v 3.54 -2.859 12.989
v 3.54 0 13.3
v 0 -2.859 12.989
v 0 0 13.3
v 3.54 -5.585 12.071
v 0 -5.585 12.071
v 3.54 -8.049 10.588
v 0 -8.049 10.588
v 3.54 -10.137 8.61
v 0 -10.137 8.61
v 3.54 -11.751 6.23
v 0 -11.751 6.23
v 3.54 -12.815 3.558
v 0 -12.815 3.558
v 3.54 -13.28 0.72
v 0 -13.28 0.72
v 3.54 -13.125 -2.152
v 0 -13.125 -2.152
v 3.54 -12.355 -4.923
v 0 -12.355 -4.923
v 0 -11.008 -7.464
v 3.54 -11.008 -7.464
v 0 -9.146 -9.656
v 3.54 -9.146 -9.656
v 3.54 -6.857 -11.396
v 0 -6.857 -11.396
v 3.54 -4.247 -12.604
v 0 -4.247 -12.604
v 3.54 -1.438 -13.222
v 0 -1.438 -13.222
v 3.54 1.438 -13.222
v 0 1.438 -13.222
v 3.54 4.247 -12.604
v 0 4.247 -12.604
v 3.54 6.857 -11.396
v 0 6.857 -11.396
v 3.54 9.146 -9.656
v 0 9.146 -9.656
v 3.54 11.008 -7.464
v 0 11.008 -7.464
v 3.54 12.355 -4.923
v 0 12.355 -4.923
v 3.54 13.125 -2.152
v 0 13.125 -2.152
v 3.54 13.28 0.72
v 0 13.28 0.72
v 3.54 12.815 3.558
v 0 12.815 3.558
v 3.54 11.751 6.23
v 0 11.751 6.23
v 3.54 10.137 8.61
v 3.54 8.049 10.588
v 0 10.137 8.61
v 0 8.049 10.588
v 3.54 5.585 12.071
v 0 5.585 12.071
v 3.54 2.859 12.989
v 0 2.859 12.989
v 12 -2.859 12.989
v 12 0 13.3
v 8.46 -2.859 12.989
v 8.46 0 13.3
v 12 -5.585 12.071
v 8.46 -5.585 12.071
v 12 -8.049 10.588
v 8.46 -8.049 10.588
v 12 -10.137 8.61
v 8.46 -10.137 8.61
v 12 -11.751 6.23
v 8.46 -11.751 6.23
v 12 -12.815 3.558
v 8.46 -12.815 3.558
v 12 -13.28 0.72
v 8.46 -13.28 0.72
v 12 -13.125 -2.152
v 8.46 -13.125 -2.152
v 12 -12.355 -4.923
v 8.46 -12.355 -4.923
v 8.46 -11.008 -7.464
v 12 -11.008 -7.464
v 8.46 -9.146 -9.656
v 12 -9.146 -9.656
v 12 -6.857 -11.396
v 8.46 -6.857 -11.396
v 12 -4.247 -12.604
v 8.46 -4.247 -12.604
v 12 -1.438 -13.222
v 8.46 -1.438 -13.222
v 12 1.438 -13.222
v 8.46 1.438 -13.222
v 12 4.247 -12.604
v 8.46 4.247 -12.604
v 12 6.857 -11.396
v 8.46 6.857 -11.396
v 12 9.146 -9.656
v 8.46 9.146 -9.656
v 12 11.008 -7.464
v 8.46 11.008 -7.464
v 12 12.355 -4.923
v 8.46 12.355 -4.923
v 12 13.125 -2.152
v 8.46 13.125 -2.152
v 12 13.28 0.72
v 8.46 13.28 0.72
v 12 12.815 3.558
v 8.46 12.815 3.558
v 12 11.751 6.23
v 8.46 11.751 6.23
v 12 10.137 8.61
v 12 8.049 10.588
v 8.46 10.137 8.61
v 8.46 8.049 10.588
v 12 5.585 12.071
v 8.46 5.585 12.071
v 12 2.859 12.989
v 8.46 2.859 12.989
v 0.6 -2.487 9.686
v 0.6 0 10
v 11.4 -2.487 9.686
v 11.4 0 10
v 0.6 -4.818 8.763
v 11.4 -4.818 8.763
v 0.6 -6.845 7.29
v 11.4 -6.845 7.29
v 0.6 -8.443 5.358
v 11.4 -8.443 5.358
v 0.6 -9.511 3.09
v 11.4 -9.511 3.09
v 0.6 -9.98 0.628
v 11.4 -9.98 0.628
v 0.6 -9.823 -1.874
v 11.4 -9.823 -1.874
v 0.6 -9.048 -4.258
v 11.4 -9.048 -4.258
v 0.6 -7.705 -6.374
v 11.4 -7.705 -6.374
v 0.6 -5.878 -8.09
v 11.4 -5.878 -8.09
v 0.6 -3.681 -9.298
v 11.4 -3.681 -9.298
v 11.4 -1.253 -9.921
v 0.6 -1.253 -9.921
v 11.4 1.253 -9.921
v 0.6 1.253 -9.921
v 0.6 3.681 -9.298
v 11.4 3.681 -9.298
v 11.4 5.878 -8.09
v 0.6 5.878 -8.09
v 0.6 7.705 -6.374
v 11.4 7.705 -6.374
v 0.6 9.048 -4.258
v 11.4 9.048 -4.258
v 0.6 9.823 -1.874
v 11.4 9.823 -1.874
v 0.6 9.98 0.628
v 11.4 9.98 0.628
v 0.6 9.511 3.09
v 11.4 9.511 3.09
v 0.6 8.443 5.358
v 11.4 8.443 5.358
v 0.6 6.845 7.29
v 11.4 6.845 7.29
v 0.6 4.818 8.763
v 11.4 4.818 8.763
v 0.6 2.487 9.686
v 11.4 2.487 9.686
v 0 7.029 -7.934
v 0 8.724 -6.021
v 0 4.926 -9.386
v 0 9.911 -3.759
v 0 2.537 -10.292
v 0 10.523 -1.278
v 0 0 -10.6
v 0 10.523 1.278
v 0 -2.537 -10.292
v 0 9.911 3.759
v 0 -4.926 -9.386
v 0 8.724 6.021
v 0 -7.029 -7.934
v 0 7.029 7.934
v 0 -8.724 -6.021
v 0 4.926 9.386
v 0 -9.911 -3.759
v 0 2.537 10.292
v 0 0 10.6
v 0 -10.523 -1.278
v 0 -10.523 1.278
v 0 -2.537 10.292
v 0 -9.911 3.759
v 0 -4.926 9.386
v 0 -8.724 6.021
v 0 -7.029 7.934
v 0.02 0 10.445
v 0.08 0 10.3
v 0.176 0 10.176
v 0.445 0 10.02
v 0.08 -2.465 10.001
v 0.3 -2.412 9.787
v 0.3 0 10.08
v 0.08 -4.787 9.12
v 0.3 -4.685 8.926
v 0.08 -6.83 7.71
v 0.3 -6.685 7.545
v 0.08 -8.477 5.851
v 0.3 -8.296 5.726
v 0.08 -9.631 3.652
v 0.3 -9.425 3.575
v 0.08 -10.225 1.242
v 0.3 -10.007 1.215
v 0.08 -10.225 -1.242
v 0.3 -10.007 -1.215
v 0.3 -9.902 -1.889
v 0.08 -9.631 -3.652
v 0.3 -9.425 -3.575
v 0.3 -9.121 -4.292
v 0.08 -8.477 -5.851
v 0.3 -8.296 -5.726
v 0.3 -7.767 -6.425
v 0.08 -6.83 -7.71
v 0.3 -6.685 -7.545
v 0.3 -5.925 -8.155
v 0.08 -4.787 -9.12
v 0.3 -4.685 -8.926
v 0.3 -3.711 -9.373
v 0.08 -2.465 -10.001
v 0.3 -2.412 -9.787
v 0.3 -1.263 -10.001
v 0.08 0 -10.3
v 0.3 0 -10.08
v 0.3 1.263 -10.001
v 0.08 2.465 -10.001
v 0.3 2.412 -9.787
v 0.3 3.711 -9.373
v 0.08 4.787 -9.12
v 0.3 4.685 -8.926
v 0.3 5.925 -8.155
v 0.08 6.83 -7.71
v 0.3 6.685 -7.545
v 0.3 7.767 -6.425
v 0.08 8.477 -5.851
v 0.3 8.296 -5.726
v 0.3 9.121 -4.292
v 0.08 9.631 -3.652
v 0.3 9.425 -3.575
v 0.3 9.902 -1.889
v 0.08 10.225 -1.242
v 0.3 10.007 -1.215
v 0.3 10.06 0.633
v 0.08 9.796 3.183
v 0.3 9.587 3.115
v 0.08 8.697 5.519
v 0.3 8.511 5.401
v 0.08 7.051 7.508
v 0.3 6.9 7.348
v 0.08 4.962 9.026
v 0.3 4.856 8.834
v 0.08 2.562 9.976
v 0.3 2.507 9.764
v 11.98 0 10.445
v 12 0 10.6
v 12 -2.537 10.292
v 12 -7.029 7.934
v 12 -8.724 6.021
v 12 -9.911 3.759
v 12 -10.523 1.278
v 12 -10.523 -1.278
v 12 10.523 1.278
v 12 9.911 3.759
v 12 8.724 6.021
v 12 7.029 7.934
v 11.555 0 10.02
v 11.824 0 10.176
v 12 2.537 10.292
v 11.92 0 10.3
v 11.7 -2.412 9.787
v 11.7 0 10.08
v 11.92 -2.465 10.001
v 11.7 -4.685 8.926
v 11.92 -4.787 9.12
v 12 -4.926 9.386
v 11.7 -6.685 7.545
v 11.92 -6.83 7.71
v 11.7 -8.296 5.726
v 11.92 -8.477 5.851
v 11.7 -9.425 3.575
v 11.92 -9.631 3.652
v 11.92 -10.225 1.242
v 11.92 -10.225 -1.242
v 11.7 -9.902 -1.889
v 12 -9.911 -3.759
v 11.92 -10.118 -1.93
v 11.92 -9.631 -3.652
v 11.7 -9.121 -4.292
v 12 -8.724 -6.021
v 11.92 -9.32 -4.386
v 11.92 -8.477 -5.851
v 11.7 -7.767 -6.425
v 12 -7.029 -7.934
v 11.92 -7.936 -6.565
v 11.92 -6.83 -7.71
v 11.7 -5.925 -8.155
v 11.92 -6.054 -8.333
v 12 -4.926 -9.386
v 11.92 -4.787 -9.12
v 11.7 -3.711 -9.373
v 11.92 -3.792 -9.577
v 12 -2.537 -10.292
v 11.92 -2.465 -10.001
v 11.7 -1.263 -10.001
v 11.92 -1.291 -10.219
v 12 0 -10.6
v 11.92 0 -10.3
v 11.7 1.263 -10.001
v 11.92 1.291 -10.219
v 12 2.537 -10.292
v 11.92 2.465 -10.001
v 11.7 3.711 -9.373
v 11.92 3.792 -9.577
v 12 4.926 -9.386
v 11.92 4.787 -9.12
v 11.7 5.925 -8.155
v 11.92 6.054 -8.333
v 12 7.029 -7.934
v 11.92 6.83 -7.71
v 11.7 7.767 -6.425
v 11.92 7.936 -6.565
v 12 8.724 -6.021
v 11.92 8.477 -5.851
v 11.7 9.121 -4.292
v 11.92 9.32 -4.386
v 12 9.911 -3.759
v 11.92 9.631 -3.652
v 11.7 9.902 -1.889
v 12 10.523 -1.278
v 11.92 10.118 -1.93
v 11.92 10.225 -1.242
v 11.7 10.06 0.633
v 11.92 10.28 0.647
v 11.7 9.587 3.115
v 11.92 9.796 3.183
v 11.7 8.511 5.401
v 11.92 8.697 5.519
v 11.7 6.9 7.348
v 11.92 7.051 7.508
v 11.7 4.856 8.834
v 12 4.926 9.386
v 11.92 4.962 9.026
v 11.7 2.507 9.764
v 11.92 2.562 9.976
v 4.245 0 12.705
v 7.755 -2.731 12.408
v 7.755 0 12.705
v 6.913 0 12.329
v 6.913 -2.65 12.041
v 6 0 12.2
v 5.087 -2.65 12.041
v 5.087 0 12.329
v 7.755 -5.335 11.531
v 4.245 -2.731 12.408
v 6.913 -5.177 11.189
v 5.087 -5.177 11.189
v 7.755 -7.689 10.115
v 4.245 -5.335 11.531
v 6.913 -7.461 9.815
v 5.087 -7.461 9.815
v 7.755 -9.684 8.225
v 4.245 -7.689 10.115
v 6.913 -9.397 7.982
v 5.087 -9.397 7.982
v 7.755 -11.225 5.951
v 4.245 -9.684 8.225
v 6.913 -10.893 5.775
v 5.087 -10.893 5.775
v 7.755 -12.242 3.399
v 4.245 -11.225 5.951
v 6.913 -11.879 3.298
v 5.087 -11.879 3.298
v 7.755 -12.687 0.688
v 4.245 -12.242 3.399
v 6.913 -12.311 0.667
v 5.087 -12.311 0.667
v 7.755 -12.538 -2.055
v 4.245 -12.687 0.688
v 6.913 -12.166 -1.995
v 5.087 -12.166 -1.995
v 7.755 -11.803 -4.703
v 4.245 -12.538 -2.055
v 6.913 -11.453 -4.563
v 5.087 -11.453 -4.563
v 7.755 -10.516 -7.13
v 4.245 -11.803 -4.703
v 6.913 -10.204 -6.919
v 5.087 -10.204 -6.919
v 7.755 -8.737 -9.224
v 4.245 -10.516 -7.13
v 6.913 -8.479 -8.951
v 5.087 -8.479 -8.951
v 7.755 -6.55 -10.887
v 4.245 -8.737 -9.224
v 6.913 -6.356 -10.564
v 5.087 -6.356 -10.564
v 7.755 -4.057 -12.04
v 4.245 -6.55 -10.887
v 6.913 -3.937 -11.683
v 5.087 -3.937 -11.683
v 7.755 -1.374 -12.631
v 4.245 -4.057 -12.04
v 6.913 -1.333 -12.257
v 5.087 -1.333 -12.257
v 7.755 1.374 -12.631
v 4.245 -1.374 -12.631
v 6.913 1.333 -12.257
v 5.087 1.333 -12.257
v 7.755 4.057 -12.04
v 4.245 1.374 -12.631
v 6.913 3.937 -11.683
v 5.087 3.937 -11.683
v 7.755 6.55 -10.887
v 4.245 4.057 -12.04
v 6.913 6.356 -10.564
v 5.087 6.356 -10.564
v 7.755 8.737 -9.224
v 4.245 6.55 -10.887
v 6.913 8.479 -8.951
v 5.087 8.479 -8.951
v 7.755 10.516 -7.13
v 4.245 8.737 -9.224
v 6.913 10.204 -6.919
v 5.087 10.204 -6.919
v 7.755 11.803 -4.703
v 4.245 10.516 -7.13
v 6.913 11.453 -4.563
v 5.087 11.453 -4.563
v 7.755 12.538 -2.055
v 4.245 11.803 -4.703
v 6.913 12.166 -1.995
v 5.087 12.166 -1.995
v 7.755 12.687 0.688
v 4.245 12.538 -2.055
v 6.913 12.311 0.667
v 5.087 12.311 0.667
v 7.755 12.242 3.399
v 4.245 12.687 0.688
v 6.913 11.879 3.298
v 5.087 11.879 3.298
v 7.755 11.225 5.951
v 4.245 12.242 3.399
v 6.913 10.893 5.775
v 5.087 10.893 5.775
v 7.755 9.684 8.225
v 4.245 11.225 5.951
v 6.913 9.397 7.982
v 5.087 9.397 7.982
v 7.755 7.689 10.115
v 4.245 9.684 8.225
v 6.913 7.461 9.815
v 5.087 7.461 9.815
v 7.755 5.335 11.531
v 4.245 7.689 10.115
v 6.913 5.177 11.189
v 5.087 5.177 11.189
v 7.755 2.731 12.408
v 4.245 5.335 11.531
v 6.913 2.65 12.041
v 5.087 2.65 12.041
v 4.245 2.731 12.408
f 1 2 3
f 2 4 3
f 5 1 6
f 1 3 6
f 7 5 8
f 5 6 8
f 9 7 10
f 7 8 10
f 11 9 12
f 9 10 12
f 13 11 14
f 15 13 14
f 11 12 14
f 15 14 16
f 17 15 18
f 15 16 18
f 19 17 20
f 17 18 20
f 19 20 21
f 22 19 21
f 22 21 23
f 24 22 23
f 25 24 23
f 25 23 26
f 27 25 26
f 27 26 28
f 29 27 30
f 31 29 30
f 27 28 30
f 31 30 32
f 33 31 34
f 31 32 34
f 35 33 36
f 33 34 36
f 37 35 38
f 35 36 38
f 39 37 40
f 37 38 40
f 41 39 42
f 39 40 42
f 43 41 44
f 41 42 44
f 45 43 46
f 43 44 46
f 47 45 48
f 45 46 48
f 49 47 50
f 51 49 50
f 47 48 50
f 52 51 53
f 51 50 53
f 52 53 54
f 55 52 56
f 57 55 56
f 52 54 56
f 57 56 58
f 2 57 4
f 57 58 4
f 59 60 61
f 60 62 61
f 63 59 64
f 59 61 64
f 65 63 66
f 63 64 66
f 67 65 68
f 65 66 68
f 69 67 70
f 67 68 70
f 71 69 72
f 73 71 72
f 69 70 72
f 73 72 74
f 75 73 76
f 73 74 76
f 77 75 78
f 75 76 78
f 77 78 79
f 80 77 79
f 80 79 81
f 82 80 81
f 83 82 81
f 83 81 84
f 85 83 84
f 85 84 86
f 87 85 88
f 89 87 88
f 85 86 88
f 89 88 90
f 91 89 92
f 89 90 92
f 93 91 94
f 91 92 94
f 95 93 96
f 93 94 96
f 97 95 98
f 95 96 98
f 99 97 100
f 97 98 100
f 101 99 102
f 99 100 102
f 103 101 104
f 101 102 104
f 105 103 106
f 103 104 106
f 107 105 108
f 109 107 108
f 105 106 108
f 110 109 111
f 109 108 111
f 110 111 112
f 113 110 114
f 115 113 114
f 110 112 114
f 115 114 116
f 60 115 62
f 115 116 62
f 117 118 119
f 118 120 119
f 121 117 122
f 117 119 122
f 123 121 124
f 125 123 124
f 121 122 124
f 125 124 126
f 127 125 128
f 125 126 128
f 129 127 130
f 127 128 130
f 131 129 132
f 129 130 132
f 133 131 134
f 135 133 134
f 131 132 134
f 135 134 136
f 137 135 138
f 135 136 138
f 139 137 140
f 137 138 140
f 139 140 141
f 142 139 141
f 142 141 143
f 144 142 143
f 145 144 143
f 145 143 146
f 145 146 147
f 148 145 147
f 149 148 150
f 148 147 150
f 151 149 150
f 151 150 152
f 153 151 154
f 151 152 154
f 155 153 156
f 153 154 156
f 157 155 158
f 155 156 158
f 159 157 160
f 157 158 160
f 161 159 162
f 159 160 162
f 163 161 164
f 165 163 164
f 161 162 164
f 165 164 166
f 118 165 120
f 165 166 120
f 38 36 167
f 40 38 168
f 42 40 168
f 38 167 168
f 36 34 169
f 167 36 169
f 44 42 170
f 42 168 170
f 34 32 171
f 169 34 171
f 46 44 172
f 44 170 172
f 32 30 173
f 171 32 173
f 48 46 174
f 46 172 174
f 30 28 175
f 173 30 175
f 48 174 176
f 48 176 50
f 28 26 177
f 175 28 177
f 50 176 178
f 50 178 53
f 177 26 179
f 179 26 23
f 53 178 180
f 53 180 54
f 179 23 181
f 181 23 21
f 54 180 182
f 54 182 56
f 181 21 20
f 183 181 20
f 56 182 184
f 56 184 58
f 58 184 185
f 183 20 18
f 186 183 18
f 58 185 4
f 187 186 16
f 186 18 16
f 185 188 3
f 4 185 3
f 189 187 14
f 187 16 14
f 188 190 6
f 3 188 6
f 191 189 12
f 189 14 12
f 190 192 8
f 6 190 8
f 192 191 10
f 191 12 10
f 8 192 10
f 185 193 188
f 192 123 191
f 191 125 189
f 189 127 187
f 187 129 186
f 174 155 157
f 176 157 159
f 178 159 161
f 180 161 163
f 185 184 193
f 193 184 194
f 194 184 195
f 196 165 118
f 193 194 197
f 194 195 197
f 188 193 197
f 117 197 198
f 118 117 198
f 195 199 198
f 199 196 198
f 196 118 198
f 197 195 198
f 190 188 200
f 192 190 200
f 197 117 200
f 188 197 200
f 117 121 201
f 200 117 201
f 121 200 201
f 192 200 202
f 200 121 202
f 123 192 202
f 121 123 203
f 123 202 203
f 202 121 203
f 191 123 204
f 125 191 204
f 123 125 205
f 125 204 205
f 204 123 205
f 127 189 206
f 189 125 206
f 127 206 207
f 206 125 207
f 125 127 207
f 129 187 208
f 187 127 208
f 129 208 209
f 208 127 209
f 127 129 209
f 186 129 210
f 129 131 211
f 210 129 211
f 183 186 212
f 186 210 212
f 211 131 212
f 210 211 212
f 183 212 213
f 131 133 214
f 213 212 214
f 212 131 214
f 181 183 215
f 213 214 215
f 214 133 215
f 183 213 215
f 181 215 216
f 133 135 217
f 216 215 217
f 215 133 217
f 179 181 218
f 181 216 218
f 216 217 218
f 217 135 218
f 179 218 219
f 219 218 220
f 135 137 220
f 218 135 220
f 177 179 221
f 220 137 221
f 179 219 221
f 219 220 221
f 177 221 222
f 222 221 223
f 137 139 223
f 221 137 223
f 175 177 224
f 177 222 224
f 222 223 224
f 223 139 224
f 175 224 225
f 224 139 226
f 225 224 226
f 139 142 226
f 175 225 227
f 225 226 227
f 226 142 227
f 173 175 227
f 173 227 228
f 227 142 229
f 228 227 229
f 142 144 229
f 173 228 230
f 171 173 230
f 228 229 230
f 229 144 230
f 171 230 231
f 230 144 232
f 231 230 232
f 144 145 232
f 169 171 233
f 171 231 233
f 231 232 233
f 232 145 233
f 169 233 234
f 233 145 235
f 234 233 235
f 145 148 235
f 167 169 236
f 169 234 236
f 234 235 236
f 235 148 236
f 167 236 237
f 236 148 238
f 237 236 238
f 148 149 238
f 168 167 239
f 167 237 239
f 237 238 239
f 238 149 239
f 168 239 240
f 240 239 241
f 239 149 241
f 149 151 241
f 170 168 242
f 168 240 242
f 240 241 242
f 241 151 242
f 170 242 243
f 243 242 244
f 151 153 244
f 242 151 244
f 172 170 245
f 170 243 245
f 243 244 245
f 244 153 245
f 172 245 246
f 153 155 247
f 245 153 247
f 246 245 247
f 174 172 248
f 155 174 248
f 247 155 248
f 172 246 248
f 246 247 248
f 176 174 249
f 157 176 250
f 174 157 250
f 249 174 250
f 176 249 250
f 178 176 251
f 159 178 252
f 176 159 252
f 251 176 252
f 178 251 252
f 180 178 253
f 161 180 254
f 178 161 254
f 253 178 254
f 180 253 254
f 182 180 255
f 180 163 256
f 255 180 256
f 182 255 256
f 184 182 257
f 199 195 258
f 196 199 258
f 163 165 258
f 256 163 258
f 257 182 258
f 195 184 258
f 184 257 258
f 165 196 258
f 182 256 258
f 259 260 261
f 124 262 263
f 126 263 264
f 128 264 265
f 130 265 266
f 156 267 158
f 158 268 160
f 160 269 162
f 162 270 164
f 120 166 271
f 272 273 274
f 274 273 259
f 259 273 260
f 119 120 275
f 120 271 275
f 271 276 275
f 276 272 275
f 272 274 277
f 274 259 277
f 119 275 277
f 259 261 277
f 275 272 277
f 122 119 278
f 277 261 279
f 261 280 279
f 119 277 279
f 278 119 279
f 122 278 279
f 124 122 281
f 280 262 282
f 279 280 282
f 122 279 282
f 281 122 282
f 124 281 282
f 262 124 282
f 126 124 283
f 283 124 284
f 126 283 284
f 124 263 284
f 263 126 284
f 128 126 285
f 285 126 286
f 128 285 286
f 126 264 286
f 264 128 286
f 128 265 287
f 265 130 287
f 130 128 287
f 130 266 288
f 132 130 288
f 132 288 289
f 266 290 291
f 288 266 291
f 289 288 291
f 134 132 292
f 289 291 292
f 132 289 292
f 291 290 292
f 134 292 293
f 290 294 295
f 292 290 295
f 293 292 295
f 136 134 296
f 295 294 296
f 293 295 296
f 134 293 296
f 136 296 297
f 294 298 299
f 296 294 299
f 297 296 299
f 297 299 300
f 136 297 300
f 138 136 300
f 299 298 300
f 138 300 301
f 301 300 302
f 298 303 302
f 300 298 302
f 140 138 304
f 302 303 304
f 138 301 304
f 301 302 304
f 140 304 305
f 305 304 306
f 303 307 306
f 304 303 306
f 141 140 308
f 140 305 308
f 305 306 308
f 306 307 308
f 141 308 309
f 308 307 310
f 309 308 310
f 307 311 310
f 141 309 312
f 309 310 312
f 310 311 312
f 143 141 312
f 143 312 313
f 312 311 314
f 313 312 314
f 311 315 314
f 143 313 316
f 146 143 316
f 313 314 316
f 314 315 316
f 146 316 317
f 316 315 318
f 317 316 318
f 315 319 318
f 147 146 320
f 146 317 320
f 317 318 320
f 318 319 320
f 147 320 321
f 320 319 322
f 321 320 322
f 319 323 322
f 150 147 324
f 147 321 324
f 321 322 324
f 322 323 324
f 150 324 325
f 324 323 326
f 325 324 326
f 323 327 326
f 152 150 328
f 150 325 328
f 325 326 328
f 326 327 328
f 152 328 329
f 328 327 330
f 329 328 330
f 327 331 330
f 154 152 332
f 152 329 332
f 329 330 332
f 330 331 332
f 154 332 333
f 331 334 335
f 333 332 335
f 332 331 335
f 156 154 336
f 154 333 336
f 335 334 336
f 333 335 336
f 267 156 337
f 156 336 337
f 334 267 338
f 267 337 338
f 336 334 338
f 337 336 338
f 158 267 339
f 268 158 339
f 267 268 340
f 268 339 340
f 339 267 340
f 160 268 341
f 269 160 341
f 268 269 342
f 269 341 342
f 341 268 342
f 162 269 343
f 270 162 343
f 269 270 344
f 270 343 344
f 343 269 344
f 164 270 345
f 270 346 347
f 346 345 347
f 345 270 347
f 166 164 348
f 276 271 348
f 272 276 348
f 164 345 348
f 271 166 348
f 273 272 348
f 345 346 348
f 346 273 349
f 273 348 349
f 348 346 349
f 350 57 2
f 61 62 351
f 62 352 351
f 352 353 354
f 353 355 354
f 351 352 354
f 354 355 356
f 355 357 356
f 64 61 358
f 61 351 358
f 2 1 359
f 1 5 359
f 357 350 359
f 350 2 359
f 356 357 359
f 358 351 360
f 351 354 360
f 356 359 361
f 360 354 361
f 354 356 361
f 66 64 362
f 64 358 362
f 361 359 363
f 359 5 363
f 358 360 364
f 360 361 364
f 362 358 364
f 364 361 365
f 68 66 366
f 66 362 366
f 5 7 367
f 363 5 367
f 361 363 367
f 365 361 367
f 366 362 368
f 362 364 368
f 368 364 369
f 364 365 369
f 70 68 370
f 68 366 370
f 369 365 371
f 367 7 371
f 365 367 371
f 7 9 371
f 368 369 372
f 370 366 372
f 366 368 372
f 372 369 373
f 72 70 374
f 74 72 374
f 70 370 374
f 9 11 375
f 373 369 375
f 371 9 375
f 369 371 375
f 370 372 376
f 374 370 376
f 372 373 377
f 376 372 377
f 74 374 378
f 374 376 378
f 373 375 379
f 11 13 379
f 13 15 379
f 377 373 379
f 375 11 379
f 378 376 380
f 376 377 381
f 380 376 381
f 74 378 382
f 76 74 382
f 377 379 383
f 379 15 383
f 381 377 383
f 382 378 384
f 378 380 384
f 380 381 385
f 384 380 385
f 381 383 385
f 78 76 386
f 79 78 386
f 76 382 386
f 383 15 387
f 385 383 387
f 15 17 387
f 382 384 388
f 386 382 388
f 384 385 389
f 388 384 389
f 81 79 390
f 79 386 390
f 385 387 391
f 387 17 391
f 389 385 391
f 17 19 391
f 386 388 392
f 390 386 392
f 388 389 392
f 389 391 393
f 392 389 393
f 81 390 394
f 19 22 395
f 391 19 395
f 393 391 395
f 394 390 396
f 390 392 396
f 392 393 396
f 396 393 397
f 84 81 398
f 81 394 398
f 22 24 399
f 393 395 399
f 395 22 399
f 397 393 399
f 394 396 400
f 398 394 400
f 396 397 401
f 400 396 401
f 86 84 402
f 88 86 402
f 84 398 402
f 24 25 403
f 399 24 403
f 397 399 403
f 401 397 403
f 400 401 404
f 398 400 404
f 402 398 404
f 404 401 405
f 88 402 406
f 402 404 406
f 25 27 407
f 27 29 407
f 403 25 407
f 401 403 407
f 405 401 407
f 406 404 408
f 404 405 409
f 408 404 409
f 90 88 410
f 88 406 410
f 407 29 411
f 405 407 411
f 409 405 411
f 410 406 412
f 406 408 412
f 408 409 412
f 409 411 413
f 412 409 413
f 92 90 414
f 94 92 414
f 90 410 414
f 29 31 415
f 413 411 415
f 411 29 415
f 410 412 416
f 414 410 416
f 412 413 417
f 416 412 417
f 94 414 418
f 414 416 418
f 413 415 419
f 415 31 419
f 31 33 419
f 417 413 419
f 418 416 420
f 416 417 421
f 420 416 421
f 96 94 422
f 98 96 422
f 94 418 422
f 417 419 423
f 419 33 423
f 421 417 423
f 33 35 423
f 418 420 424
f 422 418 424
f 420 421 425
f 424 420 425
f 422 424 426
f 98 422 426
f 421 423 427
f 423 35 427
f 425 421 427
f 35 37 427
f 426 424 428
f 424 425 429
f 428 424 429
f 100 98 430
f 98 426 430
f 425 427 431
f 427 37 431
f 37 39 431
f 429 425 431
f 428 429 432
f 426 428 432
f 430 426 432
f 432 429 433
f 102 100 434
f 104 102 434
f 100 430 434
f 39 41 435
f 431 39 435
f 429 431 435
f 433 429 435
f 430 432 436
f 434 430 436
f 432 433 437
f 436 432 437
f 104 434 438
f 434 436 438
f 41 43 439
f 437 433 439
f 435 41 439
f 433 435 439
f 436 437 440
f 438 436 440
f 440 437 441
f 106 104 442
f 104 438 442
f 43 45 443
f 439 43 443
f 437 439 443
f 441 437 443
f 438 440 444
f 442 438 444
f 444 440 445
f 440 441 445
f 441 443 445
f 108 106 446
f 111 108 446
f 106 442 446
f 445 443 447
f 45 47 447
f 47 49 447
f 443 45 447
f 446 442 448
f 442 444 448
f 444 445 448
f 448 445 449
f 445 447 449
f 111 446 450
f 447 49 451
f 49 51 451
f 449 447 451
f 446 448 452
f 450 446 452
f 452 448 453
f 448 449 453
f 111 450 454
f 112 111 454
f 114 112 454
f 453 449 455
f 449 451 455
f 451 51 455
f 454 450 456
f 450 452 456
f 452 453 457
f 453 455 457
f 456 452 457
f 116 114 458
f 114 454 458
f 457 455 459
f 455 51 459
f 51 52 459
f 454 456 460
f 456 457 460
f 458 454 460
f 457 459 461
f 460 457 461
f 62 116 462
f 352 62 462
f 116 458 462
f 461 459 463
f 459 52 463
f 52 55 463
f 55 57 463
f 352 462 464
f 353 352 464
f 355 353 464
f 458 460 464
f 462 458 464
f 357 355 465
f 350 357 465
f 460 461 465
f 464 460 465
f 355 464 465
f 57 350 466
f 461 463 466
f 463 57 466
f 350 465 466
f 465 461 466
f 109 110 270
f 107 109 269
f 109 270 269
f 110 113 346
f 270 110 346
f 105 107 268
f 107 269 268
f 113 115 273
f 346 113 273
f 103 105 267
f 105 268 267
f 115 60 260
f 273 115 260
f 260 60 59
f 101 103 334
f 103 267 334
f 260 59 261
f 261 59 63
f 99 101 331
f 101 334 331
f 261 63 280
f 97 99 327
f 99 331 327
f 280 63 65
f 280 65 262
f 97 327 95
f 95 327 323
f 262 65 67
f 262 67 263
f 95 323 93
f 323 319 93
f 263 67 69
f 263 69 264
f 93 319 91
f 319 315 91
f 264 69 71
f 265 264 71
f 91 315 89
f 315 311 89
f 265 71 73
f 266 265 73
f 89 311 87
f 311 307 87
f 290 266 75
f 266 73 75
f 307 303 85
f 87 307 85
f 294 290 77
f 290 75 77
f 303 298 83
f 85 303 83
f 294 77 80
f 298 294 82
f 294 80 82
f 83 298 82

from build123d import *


with BuildPart() as part:
    # Esquisse1 → Base-Révolution (revolve)
    with BuildSketch(Plane(origin=(0, 0, 0), x_dir=(1, 0, 0), z_dir=(0, 1, 0))):
        with BuildLine():
            Line((0, 13.3), (0, 10.6))
            ThreePointArc((0, 10.6), (0.175735931, 10.175735931), (0.6, 10))
            Line((0.6, 10), (11.4, 10))
            ThreePointArc((11.4, 10), (11.824264069, 10.175735931), (12, 10.6))
            Line((12, 10.6), (12, 13.3))
            Line((12, 13.3), (8.459674775, 13.3))
            ThreePointArc((8.459674775, 13.3), (6, 12.2), (3.540325225, 13.3))
            Line((3.540325225, 13.3), (0, 13.3))
        make_face()
    revolve(axis=Axis((0, 0, 0), (1, 0, 0)))


solid = part.part
